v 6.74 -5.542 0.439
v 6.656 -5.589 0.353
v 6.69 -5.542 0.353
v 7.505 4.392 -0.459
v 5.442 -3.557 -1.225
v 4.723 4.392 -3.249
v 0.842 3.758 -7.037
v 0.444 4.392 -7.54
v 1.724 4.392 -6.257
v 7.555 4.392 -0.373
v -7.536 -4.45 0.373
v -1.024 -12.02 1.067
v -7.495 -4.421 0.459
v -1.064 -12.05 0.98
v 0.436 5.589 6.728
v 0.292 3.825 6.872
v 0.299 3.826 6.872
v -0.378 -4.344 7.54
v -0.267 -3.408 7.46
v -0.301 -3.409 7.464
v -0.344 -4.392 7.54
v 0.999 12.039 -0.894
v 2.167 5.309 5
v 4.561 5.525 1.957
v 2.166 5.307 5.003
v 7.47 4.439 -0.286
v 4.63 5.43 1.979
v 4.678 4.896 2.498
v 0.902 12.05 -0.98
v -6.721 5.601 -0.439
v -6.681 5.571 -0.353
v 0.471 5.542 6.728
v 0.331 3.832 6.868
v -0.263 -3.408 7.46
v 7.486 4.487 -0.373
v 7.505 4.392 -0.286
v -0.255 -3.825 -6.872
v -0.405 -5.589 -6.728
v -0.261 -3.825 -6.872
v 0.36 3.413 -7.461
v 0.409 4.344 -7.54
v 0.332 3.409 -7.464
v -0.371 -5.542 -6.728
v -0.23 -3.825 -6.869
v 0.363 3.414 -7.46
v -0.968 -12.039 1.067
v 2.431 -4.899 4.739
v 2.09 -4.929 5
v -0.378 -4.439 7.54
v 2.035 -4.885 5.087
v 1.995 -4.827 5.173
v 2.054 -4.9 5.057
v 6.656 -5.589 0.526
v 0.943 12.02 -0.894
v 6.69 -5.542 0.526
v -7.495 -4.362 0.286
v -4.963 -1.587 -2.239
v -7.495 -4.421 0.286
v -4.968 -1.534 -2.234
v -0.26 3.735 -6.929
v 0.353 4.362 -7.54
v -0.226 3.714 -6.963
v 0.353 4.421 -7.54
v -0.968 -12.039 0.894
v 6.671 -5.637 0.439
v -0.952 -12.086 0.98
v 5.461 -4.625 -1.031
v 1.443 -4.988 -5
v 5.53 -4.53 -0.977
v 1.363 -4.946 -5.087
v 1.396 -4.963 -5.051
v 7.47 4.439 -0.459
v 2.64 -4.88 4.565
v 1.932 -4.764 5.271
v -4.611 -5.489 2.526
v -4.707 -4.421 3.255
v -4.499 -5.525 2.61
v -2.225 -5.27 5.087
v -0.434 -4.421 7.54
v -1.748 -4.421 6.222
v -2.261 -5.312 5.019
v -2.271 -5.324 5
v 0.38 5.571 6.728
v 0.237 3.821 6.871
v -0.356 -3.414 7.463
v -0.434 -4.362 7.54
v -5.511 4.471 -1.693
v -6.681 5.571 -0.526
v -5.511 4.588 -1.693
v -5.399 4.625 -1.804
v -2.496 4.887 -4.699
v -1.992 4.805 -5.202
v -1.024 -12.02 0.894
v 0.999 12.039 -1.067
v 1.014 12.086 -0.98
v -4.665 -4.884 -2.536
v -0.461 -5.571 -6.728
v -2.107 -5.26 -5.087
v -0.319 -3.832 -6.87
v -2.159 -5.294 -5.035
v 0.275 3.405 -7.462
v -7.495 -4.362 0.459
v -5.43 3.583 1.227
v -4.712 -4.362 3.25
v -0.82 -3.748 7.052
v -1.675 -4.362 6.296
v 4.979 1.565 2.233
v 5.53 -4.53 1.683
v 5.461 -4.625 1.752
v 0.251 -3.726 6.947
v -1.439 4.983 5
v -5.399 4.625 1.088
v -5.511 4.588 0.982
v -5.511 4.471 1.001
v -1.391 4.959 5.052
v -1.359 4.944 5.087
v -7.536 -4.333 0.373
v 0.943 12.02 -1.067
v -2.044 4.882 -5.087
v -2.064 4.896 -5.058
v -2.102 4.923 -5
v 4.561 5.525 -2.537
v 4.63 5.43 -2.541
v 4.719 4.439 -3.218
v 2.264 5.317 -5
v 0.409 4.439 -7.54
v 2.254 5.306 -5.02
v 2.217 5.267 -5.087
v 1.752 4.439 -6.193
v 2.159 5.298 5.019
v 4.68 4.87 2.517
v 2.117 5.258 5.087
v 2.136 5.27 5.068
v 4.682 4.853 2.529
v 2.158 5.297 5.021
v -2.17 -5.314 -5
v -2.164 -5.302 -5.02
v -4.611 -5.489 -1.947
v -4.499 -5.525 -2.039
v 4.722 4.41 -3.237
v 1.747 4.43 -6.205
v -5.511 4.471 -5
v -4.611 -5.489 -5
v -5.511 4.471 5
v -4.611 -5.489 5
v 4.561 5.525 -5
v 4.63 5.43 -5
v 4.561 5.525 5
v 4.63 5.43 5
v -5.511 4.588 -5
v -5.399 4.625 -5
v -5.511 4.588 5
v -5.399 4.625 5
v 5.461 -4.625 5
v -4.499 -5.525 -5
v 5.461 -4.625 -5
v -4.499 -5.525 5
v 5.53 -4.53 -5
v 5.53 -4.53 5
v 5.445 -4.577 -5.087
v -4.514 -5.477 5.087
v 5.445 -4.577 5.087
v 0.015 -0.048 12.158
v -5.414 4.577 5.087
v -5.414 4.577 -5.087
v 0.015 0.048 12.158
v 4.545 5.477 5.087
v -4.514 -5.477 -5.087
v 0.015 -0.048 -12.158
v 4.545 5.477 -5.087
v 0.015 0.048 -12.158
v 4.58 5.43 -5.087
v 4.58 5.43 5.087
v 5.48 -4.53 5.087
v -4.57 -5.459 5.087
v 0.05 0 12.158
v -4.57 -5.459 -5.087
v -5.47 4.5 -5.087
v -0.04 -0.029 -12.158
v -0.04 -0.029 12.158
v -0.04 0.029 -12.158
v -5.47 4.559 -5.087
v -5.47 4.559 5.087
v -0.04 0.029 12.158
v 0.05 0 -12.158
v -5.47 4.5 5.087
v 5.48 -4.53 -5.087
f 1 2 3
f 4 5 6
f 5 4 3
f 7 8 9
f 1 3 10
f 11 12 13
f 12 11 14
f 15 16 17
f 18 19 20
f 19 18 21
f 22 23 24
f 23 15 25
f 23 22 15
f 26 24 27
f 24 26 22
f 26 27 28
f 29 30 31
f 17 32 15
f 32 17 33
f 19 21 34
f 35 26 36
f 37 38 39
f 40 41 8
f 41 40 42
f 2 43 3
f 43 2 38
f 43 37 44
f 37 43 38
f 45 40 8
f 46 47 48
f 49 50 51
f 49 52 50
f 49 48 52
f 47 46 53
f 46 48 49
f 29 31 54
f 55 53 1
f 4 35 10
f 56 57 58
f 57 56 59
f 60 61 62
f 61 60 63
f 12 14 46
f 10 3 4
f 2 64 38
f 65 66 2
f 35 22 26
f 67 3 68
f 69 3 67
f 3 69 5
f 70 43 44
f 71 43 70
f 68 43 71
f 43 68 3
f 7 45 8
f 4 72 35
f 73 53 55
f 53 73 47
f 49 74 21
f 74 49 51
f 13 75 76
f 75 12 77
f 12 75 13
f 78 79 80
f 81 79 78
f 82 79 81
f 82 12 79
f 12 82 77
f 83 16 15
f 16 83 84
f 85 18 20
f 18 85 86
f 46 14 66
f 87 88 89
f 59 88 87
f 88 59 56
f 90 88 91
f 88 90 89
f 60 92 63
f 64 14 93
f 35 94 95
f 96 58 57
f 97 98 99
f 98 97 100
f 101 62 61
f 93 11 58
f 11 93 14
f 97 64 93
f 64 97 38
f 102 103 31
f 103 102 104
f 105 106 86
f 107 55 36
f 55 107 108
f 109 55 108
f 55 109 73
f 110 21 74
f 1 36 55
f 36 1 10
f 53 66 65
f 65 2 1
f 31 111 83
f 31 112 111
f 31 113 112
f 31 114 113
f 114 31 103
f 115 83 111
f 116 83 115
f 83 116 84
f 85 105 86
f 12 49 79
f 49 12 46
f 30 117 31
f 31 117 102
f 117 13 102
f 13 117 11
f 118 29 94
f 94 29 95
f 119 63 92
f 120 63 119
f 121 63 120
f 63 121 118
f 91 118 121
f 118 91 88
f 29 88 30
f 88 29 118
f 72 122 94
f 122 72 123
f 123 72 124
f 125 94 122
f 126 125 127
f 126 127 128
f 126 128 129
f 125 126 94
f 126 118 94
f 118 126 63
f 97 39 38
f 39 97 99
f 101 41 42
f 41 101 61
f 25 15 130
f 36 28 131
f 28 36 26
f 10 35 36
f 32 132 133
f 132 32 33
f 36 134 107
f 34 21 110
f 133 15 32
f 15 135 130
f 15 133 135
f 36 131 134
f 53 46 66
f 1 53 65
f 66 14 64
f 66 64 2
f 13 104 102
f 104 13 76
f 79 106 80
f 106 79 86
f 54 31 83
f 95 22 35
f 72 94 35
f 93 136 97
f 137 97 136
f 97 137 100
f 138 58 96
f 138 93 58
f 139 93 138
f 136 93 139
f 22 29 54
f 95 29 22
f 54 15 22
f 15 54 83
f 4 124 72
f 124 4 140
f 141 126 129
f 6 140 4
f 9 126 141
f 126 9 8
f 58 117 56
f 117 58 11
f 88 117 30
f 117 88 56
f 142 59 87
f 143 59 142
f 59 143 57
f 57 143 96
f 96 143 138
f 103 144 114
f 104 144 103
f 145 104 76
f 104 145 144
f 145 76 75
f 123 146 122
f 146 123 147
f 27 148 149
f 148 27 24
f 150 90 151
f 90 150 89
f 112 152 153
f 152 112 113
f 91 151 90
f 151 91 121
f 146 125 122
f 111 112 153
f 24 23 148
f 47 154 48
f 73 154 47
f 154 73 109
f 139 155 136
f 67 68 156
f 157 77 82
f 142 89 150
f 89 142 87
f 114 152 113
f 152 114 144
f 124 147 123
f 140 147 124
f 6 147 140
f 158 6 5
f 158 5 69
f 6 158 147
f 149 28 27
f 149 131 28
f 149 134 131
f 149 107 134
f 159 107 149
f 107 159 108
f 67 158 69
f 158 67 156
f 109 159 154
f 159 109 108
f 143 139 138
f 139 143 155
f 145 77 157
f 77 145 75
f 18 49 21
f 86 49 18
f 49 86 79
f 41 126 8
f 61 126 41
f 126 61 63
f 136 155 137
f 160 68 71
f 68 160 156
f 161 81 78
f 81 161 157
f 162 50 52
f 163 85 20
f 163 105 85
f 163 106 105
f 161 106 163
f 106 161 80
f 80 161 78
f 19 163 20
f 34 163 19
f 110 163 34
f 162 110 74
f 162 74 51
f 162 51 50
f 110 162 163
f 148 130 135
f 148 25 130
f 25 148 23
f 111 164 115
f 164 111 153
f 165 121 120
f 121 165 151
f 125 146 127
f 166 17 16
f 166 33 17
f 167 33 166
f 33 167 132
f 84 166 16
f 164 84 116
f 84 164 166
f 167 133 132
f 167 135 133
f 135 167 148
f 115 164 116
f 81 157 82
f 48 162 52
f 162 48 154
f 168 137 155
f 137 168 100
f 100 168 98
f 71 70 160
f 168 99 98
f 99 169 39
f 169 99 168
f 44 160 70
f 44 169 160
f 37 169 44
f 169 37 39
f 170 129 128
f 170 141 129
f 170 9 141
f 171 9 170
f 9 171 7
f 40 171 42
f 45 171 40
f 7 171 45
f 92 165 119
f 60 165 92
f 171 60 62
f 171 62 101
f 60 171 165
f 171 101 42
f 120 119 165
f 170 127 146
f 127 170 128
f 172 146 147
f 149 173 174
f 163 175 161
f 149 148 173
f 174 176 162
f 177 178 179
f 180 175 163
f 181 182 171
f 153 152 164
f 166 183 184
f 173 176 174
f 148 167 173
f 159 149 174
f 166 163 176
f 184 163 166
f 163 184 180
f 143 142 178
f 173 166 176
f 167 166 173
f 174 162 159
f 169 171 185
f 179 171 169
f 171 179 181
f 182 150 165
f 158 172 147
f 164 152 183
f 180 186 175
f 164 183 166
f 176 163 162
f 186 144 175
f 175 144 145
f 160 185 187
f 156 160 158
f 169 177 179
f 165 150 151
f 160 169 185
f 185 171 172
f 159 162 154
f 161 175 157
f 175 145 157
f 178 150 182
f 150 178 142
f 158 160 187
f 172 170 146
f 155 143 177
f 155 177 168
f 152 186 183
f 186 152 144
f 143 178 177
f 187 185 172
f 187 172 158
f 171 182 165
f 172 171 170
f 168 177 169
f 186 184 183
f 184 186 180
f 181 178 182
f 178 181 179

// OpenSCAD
// Auto-generated OpenSCAD file

    inner_points = 10*[[0.5429769689115526, -0.4529635870924383, 0.49999999999997413], [0.5429769689115337, -0.4529635870924037, -0.500000000000026], [-0.4529635870924116, -0.5429769689115604, 0.49999999999998984], [-0.4529635870924304, -0.5429769689115258, -0.5000000000000102], [0.4529635870924304, 0.5429769689115258, 0.5000000000000102], [0.4529635870924116, 0.5429769689115604, -0.49999999999998984], [-0.5429769689115337, 0.4529635870924037, 0.500000000000026], [-0.5429769689115526, 0.4529635870924383, -0.49999999999997413], [2.2755059616728634e-14, -4.168991678798836e-14, 1.2071067811865475], [-2.2755059616728634e-14, 4.168991678798836e-14, -1.2071067811865475]];

    outer_points = 10*[[-0.039354312458118546, -0.43916949600833827, 0.7453733238228553], [0.04209249648260477, 0.5541932458770876, 0.6641521421813528], [0.6640328188038629, -0.5541932458770876, 0.04393474451517876], [0.7454796277445863, 0.43916949600833827, -0.03728643712632368], [-0.7454796277445863, -0.43916949600833827, 0.03728643712632368], [-0.6640328188038629, 0.5541932458770876, -0.04393474451517876], [-0.04209249648260477, -0.5541932458770876, -0.6641521421813528], [0.039354312458118546, 0.43916949600833827, -0.7453733238228553], [-0.09831499537835225, -1.1990949019079598, 0.09804263913544194], [0.09831499537835225, 1.1990949019079598, -0.09804263913544194]];

    // Convex hull for inner set (I)
    module inner_hull() {
        hull() {
            for (p = inner_points) {
                translate(p) sphere(r=0.1);
            }
        }
    }

    // Convex hull for outer set (O) minus inner hull (O \ I)
    module outer_minus_inner() {
        difference() {
            hull() {
                for (p = outer_points) {
                    translate(p) sphere(r=0.1);
                }
            }
            inner_hull(); // Subtract inner hull
        }
    }

    // Convex hull for outer set (O) minus all translated inner hulls
    module outer_minus_AllTranslationInner() {
        difference() {
            hull() {
                for (p = outer_points) {
                    translate(p) sphere(r=0.1);
                }
            }
            hull() {
                translate([0,0,50]) inner_hull();
                translate([0,0,-50]) inner_hull();
            }; // Subtract translated inner hulls
        }
    }

    // Difference between outer_minus_inner and outer_minus_AllTranslationInner
    module outer_minus_inner_diff() {
        difference() {
            // Outer minus inner
            difference() {
                hull() {
                    for (p = outer_points) {
                        translate(p) sphere(r=0.1);
                    }
                }
                inner_hull();
            }

            // Subtract Outer minus AllTranslationInner
            difference() {
                hull() {
                    for (p = outer_points) {
                        translate(p) sphere(r=0.1);
                    }
                }
                hull() {
                    translate([0,0,50]) inner_hull();
                    translate([0,0,-50]) inner_hull();
                };
            }
        }
    }

    // Rendering all with colors applied
    color([1, 0, 0, 0.5]) inner_hull(); // Transparent red
    color([0, 1, 0, 1]) outer_minus_AllTranslationInner(); // Opaque green
    color([1, 1, 0, 1]) outer_minus_inner_diff(); // Opaque yellow
    
